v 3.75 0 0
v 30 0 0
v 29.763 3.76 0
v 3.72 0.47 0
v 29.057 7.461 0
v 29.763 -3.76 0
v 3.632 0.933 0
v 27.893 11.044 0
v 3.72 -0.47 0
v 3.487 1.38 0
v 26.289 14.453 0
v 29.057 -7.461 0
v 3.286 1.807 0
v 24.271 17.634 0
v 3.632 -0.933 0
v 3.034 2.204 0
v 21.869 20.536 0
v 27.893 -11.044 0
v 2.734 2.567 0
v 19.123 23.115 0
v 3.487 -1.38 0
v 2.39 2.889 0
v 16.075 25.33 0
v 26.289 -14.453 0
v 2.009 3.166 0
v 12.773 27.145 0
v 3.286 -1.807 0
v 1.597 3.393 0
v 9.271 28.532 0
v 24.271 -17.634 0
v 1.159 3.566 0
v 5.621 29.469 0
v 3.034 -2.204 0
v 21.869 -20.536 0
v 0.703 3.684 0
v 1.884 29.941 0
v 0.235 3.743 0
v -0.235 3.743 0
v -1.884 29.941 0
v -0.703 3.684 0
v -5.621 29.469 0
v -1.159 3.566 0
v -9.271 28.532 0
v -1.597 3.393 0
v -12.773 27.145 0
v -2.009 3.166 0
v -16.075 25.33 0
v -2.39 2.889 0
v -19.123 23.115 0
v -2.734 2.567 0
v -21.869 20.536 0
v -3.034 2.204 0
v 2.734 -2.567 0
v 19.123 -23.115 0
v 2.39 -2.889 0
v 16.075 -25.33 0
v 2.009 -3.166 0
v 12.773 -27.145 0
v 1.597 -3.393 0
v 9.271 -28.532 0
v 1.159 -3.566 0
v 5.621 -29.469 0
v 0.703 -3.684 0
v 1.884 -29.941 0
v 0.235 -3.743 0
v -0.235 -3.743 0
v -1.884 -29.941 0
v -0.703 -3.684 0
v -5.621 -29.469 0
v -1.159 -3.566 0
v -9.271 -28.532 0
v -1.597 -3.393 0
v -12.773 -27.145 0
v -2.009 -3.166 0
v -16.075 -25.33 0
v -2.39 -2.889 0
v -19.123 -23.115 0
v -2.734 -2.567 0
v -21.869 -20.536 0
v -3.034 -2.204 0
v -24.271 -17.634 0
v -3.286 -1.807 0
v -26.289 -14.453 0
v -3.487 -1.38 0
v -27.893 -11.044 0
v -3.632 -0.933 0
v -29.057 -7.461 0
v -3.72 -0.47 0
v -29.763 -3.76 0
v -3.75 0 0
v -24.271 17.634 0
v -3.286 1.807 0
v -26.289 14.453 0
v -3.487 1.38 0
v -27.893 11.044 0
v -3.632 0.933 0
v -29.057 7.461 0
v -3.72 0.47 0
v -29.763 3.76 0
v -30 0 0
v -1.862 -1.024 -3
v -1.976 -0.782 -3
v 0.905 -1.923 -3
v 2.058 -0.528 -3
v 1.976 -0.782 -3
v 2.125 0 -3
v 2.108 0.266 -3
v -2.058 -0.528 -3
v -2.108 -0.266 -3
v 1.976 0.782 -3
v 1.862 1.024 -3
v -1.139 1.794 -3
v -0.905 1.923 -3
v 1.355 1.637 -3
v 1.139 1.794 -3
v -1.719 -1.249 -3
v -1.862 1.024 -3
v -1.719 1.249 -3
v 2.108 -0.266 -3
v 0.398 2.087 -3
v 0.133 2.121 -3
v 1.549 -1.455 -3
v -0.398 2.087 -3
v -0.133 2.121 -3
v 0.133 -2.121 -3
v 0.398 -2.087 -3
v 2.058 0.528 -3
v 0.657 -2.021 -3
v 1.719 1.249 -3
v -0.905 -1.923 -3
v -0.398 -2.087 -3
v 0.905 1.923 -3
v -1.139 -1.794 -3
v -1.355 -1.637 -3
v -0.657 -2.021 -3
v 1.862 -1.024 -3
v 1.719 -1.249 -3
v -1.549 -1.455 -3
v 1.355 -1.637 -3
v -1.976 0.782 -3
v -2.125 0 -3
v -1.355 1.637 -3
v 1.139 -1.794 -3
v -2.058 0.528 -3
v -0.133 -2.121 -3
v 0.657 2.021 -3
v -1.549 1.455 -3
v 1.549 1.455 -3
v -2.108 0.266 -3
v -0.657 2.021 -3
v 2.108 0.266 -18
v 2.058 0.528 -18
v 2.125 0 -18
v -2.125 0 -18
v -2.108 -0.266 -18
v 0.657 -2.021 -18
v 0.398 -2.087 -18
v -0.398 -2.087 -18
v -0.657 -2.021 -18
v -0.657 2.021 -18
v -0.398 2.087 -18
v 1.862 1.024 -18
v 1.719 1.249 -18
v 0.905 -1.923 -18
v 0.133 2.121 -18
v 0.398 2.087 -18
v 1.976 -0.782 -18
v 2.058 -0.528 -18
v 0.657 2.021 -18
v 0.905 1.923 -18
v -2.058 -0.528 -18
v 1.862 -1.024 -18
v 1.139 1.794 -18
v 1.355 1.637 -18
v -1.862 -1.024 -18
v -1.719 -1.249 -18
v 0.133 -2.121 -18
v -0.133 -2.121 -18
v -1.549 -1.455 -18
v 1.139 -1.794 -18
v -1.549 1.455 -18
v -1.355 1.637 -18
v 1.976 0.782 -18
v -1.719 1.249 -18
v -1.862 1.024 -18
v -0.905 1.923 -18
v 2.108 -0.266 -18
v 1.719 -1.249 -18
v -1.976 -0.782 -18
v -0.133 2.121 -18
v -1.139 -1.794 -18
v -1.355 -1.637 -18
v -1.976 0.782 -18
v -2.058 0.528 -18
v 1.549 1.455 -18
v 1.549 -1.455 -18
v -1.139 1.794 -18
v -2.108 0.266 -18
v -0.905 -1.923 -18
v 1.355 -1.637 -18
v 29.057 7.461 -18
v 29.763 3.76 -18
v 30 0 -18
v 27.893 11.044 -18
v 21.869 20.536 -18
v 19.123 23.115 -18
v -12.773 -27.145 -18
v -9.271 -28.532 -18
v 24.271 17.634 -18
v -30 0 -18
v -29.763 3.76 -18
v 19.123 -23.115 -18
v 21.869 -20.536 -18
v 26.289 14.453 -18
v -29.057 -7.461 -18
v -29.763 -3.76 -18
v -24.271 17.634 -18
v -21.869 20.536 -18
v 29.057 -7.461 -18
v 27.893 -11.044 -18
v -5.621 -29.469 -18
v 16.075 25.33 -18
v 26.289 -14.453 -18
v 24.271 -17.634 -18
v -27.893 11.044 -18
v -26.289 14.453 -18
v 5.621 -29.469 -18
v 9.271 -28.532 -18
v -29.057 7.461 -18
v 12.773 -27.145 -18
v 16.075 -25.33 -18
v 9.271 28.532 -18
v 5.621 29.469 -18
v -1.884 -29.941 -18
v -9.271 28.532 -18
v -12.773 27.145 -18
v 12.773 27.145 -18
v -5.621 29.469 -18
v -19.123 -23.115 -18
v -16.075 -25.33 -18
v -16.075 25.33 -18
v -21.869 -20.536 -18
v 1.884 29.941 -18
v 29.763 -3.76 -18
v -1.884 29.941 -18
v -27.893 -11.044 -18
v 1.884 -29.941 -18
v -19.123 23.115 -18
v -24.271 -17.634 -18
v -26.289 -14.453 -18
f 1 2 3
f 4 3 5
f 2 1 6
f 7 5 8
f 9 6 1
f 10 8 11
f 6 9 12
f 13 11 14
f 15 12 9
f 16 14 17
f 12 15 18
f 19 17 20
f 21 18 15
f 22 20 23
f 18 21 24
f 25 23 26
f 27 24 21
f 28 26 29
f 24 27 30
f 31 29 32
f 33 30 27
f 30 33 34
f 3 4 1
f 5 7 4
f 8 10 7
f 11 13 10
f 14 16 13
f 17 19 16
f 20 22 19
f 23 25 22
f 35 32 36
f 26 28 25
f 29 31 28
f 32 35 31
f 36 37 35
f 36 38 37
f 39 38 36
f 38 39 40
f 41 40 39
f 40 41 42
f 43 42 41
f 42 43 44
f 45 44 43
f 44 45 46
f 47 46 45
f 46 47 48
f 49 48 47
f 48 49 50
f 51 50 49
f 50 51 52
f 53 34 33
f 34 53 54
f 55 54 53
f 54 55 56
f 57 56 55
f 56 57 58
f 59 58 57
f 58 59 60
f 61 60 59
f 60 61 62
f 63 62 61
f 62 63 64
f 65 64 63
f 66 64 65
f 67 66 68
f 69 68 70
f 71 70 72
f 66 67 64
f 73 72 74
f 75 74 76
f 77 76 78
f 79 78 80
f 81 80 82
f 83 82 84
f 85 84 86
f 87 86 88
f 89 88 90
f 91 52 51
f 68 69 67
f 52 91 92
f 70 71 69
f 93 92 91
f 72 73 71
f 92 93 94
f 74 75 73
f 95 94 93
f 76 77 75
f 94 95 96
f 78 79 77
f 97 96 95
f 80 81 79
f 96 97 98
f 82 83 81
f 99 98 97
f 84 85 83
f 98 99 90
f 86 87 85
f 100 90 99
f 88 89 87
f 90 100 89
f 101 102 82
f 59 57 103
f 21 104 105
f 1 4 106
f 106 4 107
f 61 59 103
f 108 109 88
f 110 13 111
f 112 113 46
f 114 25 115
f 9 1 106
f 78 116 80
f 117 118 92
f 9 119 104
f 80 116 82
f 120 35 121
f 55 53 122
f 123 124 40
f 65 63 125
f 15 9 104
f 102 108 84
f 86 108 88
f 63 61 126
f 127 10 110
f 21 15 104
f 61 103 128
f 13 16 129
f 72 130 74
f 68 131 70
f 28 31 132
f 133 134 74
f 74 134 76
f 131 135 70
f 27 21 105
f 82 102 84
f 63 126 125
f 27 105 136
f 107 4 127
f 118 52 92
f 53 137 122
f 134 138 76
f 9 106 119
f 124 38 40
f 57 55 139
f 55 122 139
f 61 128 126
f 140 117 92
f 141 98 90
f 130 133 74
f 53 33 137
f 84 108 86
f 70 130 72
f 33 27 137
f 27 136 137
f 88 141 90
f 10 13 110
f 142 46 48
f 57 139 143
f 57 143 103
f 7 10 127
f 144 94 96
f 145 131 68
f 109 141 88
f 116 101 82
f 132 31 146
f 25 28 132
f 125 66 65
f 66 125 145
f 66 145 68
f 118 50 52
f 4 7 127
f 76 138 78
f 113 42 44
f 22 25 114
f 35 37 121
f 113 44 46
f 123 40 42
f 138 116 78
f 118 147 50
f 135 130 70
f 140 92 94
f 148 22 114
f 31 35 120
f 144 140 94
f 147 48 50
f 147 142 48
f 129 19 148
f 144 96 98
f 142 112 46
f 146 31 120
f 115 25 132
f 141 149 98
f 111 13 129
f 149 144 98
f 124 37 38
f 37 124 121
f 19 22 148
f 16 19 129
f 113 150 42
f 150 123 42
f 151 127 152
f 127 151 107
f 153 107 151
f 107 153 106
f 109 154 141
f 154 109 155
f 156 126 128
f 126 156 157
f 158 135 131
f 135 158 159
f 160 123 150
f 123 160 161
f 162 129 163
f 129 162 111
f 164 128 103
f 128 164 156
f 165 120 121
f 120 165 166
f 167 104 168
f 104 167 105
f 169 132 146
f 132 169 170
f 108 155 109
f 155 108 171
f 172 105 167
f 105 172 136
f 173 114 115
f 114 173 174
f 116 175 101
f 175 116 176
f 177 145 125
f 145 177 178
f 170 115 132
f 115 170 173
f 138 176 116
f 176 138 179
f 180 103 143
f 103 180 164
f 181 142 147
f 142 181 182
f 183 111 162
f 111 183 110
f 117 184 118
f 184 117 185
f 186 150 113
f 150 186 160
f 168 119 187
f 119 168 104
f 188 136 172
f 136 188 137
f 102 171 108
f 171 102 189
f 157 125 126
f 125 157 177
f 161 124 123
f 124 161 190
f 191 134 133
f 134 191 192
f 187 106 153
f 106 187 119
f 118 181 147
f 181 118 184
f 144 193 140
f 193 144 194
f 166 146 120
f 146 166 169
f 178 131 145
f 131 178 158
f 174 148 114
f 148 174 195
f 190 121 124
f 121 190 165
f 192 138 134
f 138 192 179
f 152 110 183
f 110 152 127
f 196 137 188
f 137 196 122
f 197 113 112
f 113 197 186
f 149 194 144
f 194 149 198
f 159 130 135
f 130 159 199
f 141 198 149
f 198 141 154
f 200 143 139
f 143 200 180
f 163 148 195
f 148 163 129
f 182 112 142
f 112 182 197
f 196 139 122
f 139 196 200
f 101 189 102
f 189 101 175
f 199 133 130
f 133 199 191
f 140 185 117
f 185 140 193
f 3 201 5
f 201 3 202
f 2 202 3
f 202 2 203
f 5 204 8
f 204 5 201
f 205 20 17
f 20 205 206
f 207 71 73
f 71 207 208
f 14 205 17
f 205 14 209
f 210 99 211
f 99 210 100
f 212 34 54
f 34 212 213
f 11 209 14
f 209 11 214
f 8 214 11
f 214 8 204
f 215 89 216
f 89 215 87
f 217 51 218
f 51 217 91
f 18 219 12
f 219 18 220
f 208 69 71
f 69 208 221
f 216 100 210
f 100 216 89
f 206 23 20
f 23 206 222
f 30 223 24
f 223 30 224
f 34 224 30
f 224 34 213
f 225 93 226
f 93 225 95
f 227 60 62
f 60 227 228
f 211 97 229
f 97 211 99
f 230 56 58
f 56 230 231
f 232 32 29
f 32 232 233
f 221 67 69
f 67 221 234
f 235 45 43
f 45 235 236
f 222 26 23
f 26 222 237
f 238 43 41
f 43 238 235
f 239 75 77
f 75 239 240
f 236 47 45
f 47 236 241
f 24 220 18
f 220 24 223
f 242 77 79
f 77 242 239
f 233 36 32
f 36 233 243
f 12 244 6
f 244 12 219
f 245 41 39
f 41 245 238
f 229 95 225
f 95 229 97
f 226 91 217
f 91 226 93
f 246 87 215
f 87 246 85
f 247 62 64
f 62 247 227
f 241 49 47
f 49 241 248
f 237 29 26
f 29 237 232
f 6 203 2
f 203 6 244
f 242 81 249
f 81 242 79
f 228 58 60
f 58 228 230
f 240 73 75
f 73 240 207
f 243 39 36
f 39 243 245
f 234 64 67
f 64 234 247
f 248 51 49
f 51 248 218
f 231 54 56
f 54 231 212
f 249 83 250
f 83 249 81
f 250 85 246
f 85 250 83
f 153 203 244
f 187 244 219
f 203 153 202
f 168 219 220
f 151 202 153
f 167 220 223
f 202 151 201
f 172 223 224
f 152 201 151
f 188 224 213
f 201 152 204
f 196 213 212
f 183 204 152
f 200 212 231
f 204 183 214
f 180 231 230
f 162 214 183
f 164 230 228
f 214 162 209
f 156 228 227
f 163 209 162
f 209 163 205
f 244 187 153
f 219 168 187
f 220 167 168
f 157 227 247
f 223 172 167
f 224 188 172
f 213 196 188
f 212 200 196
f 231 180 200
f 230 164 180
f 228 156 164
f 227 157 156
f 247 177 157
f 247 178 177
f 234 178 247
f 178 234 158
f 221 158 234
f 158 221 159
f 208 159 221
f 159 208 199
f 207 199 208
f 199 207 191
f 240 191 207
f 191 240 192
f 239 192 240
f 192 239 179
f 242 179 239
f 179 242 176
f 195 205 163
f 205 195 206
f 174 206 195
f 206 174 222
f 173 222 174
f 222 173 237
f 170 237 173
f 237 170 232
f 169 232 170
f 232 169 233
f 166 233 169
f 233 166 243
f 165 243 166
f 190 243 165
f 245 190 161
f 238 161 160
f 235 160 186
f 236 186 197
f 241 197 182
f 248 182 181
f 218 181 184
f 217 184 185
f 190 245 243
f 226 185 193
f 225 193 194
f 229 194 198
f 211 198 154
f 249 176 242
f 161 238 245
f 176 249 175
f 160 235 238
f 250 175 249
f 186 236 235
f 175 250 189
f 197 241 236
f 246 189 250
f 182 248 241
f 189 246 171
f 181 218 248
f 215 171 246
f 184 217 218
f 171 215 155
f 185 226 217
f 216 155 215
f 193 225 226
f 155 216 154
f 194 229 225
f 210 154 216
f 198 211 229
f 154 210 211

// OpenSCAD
$fn = 50;

difference() {
	union() {
		translate(v = [0, 0, -18.0]) {
			cylinder(h = 18, r = 30.0);
		}
	}
	union() {
		translate(v = [0, 0, 0]) {
			rotate(a = [0, 0, 0]) {
				difference() {
					union() {
						translate(v = [0, 0, -21.0]) {
							cylinder(h = 21, r = 2.0);
						}
						translate(v = [0, 0, -3]) {
							cylinder(h = 3, r1 = 2.125, r2 = 3.75);
						}
						translate(v = [0, 0, -21.0]) {
							cylinder(h = 21, r = 2.125);
						}
						translate(v = [0, 0, -21.0]) {
							cylinder(h = 21, r = 2.0);
						}
					}
					union();
				}
			}
		}
	}
}
